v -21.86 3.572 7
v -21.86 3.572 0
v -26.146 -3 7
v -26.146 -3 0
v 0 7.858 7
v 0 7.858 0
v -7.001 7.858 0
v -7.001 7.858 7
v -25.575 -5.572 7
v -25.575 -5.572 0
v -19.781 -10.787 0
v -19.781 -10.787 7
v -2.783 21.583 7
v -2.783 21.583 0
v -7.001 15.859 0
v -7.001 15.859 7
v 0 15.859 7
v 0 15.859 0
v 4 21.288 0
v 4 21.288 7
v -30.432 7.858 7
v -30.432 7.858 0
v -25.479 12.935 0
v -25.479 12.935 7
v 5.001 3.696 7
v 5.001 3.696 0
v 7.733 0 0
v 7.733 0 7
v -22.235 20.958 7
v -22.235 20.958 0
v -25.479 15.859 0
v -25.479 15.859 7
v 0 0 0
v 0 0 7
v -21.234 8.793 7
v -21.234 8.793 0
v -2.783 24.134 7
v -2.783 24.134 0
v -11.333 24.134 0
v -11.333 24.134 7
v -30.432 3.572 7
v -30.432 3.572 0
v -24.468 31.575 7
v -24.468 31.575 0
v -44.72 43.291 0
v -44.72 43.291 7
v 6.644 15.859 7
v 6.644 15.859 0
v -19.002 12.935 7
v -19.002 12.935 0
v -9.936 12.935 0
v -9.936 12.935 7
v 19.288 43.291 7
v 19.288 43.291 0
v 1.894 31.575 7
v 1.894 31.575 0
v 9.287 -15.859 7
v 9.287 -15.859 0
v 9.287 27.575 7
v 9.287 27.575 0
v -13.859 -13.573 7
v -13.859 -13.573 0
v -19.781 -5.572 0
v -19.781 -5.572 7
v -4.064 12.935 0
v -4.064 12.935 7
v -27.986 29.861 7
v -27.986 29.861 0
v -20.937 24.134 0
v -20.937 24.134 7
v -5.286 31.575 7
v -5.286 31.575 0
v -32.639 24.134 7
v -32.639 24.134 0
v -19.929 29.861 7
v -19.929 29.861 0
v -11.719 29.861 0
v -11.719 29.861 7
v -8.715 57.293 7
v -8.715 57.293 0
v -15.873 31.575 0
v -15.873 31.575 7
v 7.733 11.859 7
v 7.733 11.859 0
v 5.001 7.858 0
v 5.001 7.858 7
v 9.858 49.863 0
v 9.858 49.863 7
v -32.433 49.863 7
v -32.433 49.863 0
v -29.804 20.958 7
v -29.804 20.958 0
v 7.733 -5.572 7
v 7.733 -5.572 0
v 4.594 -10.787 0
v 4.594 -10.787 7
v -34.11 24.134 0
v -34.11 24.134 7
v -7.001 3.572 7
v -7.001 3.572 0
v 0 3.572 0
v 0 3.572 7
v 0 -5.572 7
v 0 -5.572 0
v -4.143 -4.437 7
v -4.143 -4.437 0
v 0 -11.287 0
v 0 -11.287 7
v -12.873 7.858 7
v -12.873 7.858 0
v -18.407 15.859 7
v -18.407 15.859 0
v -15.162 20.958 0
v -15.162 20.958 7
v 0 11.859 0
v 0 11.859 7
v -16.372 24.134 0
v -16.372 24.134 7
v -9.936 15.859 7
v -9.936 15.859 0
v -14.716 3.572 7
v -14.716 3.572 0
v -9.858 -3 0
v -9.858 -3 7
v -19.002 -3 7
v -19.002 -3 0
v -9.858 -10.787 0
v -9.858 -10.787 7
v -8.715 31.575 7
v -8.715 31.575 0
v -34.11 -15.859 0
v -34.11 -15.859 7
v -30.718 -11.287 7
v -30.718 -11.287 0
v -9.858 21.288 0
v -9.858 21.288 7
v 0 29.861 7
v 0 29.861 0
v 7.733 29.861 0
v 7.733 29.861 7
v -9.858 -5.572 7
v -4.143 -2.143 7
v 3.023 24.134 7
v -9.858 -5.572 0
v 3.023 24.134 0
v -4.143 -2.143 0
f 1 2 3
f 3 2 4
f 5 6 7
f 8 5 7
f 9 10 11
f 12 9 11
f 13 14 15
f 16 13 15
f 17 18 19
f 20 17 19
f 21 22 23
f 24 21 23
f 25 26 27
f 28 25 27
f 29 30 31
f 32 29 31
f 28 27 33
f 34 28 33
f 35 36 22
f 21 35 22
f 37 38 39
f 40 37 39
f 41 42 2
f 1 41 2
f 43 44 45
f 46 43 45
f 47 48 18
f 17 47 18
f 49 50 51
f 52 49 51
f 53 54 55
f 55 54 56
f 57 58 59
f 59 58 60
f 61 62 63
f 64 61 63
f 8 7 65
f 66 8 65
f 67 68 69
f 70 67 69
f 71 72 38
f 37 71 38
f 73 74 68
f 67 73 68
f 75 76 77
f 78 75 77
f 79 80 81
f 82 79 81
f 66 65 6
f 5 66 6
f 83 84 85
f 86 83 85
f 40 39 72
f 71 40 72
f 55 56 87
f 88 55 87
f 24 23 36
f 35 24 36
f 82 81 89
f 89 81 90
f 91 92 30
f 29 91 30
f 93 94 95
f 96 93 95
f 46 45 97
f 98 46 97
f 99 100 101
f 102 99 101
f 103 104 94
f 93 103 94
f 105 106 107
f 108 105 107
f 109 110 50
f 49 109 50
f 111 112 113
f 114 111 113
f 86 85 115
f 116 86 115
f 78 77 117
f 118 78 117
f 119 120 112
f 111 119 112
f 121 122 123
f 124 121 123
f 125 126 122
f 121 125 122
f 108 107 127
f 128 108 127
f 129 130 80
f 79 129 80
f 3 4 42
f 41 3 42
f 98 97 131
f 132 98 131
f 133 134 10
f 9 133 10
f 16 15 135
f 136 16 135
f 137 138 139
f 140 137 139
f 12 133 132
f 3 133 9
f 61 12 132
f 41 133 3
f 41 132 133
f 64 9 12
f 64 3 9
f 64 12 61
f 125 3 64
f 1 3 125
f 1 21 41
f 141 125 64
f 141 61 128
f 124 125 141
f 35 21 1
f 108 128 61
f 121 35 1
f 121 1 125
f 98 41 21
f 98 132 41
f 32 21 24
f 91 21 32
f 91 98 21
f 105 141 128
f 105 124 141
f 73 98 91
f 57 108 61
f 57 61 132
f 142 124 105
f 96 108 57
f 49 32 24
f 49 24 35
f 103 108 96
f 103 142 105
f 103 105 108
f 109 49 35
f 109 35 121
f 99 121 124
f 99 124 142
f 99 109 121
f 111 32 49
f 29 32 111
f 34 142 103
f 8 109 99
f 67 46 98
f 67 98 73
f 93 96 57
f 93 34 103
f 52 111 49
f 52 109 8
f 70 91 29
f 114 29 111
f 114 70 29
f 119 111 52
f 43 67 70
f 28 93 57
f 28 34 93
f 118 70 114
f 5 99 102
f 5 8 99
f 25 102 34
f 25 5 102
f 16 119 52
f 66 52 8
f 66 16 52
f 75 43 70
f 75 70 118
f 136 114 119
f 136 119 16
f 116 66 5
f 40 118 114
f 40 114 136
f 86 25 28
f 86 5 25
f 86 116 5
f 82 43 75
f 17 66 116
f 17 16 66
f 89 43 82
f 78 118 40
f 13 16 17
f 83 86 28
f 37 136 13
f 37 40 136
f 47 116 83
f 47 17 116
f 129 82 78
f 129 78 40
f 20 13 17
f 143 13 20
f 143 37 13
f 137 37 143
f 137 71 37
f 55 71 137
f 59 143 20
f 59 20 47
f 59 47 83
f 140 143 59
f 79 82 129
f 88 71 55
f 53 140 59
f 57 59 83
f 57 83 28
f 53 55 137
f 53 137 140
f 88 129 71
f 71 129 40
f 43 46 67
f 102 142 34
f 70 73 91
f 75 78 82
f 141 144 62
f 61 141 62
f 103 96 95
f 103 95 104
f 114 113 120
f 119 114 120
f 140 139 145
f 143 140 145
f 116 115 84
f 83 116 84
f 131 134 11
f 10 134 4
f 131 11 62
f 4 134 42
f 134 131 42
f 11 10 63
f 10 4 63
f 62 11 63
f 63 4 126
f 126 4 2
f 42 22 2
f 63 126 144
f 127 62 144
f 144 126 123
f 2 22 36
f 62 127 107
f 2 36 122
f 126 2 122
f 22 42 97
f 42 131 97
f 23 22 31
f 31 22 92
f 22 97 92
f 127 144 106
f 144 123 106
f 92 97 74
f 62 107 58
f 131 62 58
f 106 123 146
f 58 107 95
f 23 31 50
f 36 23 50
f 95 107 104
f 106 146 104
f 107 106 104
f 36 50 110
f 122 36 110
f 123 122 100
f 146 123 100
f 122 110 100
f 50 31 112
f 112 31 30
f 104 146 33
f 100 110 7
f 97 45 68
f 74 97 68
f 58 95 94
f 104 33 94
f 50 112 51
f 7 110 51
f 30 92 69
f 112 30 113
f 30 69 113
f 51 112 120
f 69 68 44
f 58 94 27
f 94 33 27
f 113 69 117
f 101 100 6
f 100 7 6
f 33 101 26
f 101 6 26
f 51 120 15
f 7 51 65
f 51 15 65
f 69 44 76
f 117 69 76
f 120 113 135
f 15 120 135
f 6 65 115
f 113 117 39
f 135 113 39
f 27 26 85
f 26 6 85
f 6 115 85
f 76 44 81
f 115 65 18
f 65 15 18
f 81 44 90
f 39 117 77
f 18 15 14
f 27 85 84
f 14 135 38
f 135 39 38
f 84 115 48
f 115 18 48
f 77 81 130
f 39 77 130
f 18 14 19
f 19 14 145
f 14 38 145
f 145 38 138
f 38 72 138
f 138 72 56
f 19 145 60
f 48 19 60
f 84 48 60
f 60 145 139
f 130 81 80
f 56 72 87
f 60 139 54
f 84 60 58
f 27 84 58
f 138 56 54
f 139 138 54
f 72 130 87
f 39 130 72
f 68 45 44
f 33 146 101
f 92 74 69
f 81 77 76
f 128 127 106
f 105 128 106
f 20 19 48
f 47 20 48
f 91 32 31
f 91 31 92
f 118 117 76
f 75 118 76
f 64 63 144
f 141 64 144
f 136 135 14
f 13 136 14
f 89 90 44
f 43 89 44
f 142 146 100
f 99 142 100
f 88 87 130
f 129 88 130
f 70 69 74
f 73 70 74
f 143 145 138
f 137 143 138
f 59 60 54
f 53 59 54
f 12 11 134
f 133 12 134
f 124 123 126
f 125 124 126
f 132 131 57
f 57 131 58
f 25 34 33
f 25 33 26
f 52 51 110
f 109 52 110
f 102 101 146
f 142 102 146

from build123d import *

# Parameters (mm, degrees)
F1_DEPTH = 7


with BuildPart() as f1:
    # F0 (on Top) → F1 (new body)
    with BuildSketch(Plane.XY):
        Polygon((-34.109668, 24.133805), (-34.109668, -15.859125), (9.286875, -15.859125), (9.286875, 27.439939), (9.286875, 27.574874), (19.288125, 43.291125), (1.894246, 31.575374), (9.858374, 49.863376), (-8.715375, 31.575374), (-8.715375, 57.292875), (-15.873495, 31.575374), (-32.432627, 49.863376), (-24.468496, 31.575374), (-44.719875, 43.291125), align=None)
        Polygon((-19.780688, -10.786669), (-30.718125, -11.287125), (-25.574625, -5.572125), align=None, mode=Mode.SUBTRACT)
        Polygon((-13.858875, -13.573125), (-19.780688, -5.572125), (-9.858374, -5.572125), align=None, mode=Mode.SUBTRACT)
        Polygon((-26.146125, -3.000375), (-30.432375, 3.571875), (-21.859875, 3.571875), align=None, mode=Mode.SUBTRACT)
        Polygon((-9.858374, -3.000375), (-19.002376, -3.000375), (-14.716125, 3.571875), align=None, mode=Mode.SUBTRACT)
        Polygon((-21.233711, 8.792836), (-30.432375, 7.858125), (-25.479374, 12.934948), align=None, mode=Mode.SUBTRACT)
        Polygon((-12.873181, 7.858125), (-19.002376, 12.934948), (-9.936156, 12.934948), align=None, mode=Mode.SUBTRACT)
        Polygon((-25.479374, 15.859125), (-29.804411, 20.95796), (-22.234662, 20.95796), align=None, mode=Mode.SUBTRACT)
        Polygon((-9.936156, 15.859125), (-18.407172, 15.859125), (-15.162459, 20.95796), align=None, mode=Mode.SUBTRACT)
        Polygon((0, -11.287125), (-9.858374, -10.786669), (-4.143375, -4.43667), align=None, mode=Mode.SUBTRACT)
        Polygon((-4.143375, -2.143125), (-7.000875, 3.571875), (0, 3.571875), align=None, mode=Mode.SUBTRACT)
        Polygon((7.732536, -5.572125), (4.593785, -10.786669), (0, -5.572125), align=None, mode=Mode.SUBTRACT)
        Polygon((7.732536, 0), (0, 0), (5.000625, 3.696115), align=None, mode=Mode.SUBTRACT)
        Polygon((0, 7.858125), (-7.000875, 7.858125), (-4.06385, 12.934948), align=None, mode=Mode.SUBTRACT)
        Polygon((-7.000875, 15.859125), (-9.858374, 21.288376), (-2.783154, 21.583176), align=None, mode=Mode.SUBTRACT)
        Polygon((5.000625, 7.858125), (0, 11.858624), (7.732536, 11.858624), align=None, mode=Mode.SUBTRACT)
        Polygon((6.643688, 15.859125), (0, 15.859125), (4.0005, 21.288376), align=None, mode=Mode.SUBTRACT)
        Polygon((-20.936942, 24.133805), (-32.638886, 24.133805), (-27.985641, 29.860875), align=None, mode=Mode.SUBTRACT)
        Polygon((-16.371781, 24.133805), (-19.928829, 29.860875), (-11.718535, 29.860875), align=None, mode=Mode.SUBTRACT)
        Polygon((-2.783154, 24.133805), (-11.332653, 24.133805), (-5.286376, 31.575374), align=None, mode=Mode.SUBTRACT)
        Polygon((3.02262, 24.133805), (0, 29.860875), (7.732536, 29.860875), align=None, mode=Mode.SUBTRACT)
    extrude(amount=F1_DEPTH)


solid = f1.part
